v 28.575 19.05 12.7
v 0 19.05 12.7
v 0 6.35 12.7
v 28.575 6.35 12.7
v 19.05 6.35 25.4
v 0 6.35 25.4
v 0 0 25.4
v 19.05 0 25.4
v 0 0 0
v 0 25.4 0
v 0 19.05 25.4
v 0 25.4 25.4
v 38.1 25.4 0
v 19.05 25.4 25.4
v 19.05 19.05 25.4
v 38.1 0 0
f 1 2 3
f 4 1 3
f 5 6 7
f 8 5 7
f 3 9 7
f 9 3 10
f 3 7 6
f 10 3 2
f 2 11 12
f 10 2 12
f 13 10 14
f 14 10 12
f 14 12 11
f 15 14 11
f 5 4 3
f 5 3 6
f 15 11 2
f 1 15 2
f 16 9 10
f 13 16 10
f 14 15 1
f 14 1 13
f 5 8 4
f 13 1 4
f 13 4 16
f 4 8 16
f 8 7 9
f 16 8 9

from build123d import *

# Parameters (mm, degrees)
F1_DEPTH = 38.1
F3_DEPTH = 25.4


with BuildPart() as f1:
    # F0 (on Right) → F1 (new body)
    with BuildSketch(Plane.YZ):
        Polygon((0, 25.4), (0, 0), (25.4, 0), (25.4, 25.4), (19.05, 25.4), (19.05, 12.7), (6.35, 12.7), (6.35, 25.4), align=None)
    extrude(amount=F1_DEPTH)

    # F2 (on Front) → F3 (cut)
    with BuildSketch(Plane.XZ):
        Polygon((38.1, 25.4), (19.05, 25.4), (38.1, 0), align=None)
    extrude(amount=-F3_DEPTH, mode=Mode.SUBTRACT)


solid = f1.part
